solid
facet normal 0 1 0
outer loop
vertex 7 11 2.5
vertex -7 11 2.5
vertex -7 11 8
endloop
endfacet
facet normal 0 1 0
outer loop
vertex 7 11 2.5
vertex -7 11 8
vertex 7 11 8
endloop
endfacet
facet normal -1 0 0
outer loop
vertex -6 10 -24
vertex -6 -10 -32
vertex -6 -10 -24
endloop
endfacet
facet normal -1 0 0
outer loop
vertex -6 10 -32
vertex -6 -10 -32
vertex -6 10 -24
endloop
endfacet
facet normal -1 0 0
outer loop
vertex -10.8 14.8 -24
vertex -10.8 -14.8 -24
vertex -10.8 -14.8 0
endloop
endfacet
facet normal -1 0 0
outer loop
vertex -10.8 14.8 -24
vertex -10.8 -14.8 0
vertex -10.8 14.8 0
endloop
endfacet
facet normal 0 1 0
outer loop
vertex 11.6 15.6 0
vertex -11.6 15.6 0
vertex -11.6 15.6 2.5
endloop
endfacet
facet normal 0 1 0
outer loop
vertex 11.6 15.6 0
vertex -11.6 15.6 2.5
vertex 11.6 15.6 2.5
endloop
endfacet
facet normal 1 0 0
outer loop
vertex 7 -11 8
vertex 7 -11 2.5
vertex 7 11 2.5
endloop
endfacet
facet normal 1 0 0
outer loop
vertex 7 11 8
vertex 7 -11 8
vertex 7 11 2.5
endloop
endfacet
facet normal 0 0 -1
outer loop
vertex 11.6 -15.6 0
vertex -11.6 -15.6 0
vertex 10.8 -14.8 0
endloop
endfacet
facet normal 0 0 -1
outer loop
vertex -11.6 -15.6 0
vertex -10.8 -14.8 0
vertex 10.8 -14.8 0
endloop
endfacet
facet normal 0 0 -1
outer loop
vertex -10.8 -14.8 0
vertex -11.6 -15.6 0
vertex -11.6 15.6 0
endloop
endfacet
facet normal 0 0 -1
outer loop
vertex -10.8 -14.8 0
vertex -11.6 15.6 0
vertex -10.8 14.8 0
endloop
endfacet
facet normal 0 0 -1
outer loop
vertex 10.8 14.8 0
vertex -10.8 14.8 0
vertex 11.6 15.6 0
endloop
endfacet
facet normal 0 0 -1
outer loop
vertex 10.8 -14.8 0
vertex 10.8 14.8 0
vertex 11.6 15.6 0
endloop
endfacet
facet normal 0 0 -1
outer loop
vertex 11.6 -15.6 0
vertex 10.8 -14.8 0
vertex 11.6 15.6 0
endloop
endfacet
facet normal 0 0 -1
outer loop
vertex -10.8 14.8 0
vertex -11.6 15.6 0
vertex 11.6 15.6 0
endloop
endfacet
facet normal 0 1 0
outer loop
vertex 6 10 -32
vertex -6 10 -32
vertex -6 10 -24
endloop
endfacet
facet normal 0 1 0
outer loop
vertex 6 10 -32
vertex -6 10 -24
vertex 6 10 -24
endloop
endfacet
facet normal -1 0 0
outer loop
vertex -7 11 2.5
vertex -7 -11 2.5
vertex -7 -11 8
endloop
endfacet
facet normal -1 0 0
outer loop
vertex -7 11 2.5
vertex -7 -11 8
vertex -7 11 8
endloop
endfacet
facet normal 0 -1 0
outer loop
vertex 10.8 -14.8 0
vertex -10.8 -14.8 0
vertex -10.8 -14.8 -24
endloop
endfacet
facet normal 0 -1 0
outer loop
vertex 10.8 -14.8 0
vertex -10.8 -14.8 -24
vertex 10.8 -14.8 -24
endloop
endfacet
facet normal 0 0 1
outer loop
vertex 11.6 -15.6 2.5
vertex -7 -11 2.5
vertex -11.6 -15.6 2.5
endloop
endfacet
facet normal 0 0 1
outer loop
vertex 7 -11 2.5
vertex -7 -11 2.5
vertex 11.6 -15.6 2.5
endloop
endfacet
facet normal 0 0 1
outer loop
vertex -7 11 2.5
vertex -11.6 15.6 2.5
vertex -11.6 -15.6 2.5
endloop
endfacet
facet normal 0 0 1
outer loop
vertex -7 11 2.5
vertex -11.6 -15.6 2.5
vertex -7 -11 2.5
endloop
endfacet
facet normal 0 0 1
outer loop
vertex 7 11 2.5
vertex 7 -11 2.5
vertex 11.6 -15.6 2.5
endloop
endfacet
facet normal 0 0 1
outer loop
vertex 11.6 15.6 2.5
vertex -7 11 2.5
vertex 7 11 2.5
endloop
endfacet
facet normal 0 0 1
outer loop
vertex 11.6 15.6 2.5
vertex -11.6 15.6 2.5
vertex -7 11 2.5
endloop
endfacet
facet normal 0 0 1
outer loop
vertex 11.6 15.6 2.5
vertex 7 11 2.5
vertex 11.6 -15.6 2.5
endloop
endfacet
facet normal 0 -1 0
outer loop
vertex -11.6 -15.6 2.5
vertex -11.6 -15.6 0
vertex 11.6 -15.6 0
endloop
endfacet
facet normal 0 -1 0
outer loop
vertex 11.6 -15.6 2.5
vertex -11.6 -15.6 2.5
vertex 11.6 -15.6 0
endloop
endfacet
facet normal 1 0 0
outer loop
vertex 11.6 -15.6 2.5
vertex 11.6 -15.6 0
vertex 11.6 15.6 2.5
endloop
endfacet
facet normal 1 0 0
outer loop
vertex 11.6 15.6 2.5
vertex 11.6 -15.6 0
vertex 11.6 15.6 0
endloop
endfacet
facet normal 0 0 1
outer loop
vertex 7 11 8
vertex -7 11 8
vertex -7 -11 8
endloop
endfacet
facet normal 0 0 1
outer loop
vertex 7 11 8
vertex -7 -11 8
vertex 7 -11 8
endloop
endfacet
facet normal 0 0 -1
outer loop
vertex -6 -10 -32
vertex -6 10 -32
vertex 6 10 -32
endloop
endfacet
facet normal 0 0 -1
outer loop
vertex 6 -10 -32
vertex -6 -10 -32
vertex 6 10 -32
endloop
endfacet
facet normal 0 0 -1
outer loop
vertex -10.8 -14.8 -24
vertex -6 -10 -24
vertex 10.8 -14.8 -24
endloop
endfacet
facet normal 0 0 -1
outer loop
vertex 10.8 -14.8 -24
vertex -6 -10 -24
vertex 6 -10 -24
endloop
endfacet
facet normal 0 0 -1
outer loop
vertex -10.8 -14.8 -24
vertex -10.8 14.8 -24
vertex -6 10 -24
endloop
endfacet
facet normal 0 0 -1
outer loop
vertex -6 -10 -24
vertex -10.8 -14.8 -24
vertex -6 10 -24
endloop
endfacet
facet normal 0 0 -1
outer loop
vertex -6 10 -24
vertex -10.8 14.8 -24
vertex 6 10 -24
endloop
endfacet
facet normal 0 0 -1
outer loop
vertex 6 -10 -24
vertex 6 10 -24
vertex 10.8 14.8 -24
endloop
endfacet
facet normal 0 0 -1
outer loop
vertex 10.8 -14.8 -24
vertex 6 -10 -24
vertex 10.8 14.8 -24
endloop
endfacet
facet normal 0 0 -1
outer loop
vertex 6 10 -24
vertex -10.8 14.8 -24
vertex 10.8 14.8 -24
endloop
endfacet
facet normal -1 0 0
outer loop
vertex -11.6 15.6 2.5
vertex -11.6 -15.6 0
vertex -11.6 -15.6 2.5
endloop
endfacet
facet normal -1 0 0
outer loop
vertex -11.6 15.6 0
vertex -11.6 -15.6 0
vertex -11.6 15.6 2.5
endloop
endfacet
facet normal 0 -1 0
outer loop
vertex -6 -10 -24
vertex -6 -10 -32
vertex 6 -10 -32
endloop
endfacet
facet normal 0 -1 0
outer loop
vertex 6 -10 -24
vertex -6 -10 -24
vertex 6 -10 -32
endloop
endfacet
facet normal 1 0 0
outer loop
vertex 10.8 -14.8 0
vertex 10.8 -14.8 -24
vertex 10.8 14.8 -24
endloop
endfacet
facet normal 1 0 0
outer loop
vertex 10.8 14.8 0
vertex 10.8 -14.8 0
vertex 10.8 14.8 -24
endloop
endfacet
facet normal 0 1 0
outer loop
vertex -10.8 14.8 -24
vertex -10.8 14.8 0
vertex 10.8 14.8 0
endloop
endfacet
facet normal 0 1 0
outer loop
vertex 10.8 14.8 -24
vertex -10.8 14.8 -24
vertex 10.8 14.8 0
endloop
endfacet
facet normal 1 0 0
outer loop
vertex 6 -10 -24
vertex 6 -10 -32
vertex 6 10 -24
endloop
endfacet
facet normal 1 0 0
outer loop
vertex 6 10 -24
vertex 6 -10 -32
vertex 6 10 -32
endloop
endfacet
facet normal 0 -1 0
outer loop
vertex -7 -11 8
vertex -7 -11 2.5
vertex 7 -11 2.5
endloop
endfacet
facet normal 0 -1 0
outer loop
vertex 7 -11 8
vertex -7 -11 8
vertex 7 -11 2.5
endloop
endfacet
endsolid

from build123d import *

# Parameters (mm, degrees)
SKETCH1_W       = 23.2
SKETCH1_H       = 31.2
BEZEL_DEPTH     = 2.5
SKETCH2_W       = 14
SKETCH2_H       = 22
ROCKER_DEPTH    = 5.5
SKETCH3_W       = 21.6
SKETCH3_H       = 29.6
BODY_DEPTH      = 24
SKETCH4_W       = 12
SKETCH4_H       = 20
TERMINALS_DEPTH = 8


with BuildPart() as part:
    # Sketch1 → Bezel (new body)
    with BuildSketch(Plane.XY):
        Rectangle(SKETCH1_W, SKETCH1_H)
    extrude(amount=BEZEL_DEPTH)

    # Sketch2 → Rocker (add)
    with BuildSketch(Plane.XY.offset(2.5)):
        Rectangle(SKETCH2_W, SKETCH2_H)
    extrude(amount=ROCKER_DEPTH)

    # Sketch3 → Body (add)
    with BuildSketch(Plane.XY.offset(-24)):
        Rectangle(SKETCH3_W, SKETCH3_H)
    extrude(amount=BODY_DEPTH)

    # Sketch4 → Terminals (add)
    with BuildSketch(Plane.XY.offset(-32)):
        Rectangle(SKETCH4_W, SKETCH4_H)
    extrude(amount=TERMINALS_DEPTH)


solid = part.part
